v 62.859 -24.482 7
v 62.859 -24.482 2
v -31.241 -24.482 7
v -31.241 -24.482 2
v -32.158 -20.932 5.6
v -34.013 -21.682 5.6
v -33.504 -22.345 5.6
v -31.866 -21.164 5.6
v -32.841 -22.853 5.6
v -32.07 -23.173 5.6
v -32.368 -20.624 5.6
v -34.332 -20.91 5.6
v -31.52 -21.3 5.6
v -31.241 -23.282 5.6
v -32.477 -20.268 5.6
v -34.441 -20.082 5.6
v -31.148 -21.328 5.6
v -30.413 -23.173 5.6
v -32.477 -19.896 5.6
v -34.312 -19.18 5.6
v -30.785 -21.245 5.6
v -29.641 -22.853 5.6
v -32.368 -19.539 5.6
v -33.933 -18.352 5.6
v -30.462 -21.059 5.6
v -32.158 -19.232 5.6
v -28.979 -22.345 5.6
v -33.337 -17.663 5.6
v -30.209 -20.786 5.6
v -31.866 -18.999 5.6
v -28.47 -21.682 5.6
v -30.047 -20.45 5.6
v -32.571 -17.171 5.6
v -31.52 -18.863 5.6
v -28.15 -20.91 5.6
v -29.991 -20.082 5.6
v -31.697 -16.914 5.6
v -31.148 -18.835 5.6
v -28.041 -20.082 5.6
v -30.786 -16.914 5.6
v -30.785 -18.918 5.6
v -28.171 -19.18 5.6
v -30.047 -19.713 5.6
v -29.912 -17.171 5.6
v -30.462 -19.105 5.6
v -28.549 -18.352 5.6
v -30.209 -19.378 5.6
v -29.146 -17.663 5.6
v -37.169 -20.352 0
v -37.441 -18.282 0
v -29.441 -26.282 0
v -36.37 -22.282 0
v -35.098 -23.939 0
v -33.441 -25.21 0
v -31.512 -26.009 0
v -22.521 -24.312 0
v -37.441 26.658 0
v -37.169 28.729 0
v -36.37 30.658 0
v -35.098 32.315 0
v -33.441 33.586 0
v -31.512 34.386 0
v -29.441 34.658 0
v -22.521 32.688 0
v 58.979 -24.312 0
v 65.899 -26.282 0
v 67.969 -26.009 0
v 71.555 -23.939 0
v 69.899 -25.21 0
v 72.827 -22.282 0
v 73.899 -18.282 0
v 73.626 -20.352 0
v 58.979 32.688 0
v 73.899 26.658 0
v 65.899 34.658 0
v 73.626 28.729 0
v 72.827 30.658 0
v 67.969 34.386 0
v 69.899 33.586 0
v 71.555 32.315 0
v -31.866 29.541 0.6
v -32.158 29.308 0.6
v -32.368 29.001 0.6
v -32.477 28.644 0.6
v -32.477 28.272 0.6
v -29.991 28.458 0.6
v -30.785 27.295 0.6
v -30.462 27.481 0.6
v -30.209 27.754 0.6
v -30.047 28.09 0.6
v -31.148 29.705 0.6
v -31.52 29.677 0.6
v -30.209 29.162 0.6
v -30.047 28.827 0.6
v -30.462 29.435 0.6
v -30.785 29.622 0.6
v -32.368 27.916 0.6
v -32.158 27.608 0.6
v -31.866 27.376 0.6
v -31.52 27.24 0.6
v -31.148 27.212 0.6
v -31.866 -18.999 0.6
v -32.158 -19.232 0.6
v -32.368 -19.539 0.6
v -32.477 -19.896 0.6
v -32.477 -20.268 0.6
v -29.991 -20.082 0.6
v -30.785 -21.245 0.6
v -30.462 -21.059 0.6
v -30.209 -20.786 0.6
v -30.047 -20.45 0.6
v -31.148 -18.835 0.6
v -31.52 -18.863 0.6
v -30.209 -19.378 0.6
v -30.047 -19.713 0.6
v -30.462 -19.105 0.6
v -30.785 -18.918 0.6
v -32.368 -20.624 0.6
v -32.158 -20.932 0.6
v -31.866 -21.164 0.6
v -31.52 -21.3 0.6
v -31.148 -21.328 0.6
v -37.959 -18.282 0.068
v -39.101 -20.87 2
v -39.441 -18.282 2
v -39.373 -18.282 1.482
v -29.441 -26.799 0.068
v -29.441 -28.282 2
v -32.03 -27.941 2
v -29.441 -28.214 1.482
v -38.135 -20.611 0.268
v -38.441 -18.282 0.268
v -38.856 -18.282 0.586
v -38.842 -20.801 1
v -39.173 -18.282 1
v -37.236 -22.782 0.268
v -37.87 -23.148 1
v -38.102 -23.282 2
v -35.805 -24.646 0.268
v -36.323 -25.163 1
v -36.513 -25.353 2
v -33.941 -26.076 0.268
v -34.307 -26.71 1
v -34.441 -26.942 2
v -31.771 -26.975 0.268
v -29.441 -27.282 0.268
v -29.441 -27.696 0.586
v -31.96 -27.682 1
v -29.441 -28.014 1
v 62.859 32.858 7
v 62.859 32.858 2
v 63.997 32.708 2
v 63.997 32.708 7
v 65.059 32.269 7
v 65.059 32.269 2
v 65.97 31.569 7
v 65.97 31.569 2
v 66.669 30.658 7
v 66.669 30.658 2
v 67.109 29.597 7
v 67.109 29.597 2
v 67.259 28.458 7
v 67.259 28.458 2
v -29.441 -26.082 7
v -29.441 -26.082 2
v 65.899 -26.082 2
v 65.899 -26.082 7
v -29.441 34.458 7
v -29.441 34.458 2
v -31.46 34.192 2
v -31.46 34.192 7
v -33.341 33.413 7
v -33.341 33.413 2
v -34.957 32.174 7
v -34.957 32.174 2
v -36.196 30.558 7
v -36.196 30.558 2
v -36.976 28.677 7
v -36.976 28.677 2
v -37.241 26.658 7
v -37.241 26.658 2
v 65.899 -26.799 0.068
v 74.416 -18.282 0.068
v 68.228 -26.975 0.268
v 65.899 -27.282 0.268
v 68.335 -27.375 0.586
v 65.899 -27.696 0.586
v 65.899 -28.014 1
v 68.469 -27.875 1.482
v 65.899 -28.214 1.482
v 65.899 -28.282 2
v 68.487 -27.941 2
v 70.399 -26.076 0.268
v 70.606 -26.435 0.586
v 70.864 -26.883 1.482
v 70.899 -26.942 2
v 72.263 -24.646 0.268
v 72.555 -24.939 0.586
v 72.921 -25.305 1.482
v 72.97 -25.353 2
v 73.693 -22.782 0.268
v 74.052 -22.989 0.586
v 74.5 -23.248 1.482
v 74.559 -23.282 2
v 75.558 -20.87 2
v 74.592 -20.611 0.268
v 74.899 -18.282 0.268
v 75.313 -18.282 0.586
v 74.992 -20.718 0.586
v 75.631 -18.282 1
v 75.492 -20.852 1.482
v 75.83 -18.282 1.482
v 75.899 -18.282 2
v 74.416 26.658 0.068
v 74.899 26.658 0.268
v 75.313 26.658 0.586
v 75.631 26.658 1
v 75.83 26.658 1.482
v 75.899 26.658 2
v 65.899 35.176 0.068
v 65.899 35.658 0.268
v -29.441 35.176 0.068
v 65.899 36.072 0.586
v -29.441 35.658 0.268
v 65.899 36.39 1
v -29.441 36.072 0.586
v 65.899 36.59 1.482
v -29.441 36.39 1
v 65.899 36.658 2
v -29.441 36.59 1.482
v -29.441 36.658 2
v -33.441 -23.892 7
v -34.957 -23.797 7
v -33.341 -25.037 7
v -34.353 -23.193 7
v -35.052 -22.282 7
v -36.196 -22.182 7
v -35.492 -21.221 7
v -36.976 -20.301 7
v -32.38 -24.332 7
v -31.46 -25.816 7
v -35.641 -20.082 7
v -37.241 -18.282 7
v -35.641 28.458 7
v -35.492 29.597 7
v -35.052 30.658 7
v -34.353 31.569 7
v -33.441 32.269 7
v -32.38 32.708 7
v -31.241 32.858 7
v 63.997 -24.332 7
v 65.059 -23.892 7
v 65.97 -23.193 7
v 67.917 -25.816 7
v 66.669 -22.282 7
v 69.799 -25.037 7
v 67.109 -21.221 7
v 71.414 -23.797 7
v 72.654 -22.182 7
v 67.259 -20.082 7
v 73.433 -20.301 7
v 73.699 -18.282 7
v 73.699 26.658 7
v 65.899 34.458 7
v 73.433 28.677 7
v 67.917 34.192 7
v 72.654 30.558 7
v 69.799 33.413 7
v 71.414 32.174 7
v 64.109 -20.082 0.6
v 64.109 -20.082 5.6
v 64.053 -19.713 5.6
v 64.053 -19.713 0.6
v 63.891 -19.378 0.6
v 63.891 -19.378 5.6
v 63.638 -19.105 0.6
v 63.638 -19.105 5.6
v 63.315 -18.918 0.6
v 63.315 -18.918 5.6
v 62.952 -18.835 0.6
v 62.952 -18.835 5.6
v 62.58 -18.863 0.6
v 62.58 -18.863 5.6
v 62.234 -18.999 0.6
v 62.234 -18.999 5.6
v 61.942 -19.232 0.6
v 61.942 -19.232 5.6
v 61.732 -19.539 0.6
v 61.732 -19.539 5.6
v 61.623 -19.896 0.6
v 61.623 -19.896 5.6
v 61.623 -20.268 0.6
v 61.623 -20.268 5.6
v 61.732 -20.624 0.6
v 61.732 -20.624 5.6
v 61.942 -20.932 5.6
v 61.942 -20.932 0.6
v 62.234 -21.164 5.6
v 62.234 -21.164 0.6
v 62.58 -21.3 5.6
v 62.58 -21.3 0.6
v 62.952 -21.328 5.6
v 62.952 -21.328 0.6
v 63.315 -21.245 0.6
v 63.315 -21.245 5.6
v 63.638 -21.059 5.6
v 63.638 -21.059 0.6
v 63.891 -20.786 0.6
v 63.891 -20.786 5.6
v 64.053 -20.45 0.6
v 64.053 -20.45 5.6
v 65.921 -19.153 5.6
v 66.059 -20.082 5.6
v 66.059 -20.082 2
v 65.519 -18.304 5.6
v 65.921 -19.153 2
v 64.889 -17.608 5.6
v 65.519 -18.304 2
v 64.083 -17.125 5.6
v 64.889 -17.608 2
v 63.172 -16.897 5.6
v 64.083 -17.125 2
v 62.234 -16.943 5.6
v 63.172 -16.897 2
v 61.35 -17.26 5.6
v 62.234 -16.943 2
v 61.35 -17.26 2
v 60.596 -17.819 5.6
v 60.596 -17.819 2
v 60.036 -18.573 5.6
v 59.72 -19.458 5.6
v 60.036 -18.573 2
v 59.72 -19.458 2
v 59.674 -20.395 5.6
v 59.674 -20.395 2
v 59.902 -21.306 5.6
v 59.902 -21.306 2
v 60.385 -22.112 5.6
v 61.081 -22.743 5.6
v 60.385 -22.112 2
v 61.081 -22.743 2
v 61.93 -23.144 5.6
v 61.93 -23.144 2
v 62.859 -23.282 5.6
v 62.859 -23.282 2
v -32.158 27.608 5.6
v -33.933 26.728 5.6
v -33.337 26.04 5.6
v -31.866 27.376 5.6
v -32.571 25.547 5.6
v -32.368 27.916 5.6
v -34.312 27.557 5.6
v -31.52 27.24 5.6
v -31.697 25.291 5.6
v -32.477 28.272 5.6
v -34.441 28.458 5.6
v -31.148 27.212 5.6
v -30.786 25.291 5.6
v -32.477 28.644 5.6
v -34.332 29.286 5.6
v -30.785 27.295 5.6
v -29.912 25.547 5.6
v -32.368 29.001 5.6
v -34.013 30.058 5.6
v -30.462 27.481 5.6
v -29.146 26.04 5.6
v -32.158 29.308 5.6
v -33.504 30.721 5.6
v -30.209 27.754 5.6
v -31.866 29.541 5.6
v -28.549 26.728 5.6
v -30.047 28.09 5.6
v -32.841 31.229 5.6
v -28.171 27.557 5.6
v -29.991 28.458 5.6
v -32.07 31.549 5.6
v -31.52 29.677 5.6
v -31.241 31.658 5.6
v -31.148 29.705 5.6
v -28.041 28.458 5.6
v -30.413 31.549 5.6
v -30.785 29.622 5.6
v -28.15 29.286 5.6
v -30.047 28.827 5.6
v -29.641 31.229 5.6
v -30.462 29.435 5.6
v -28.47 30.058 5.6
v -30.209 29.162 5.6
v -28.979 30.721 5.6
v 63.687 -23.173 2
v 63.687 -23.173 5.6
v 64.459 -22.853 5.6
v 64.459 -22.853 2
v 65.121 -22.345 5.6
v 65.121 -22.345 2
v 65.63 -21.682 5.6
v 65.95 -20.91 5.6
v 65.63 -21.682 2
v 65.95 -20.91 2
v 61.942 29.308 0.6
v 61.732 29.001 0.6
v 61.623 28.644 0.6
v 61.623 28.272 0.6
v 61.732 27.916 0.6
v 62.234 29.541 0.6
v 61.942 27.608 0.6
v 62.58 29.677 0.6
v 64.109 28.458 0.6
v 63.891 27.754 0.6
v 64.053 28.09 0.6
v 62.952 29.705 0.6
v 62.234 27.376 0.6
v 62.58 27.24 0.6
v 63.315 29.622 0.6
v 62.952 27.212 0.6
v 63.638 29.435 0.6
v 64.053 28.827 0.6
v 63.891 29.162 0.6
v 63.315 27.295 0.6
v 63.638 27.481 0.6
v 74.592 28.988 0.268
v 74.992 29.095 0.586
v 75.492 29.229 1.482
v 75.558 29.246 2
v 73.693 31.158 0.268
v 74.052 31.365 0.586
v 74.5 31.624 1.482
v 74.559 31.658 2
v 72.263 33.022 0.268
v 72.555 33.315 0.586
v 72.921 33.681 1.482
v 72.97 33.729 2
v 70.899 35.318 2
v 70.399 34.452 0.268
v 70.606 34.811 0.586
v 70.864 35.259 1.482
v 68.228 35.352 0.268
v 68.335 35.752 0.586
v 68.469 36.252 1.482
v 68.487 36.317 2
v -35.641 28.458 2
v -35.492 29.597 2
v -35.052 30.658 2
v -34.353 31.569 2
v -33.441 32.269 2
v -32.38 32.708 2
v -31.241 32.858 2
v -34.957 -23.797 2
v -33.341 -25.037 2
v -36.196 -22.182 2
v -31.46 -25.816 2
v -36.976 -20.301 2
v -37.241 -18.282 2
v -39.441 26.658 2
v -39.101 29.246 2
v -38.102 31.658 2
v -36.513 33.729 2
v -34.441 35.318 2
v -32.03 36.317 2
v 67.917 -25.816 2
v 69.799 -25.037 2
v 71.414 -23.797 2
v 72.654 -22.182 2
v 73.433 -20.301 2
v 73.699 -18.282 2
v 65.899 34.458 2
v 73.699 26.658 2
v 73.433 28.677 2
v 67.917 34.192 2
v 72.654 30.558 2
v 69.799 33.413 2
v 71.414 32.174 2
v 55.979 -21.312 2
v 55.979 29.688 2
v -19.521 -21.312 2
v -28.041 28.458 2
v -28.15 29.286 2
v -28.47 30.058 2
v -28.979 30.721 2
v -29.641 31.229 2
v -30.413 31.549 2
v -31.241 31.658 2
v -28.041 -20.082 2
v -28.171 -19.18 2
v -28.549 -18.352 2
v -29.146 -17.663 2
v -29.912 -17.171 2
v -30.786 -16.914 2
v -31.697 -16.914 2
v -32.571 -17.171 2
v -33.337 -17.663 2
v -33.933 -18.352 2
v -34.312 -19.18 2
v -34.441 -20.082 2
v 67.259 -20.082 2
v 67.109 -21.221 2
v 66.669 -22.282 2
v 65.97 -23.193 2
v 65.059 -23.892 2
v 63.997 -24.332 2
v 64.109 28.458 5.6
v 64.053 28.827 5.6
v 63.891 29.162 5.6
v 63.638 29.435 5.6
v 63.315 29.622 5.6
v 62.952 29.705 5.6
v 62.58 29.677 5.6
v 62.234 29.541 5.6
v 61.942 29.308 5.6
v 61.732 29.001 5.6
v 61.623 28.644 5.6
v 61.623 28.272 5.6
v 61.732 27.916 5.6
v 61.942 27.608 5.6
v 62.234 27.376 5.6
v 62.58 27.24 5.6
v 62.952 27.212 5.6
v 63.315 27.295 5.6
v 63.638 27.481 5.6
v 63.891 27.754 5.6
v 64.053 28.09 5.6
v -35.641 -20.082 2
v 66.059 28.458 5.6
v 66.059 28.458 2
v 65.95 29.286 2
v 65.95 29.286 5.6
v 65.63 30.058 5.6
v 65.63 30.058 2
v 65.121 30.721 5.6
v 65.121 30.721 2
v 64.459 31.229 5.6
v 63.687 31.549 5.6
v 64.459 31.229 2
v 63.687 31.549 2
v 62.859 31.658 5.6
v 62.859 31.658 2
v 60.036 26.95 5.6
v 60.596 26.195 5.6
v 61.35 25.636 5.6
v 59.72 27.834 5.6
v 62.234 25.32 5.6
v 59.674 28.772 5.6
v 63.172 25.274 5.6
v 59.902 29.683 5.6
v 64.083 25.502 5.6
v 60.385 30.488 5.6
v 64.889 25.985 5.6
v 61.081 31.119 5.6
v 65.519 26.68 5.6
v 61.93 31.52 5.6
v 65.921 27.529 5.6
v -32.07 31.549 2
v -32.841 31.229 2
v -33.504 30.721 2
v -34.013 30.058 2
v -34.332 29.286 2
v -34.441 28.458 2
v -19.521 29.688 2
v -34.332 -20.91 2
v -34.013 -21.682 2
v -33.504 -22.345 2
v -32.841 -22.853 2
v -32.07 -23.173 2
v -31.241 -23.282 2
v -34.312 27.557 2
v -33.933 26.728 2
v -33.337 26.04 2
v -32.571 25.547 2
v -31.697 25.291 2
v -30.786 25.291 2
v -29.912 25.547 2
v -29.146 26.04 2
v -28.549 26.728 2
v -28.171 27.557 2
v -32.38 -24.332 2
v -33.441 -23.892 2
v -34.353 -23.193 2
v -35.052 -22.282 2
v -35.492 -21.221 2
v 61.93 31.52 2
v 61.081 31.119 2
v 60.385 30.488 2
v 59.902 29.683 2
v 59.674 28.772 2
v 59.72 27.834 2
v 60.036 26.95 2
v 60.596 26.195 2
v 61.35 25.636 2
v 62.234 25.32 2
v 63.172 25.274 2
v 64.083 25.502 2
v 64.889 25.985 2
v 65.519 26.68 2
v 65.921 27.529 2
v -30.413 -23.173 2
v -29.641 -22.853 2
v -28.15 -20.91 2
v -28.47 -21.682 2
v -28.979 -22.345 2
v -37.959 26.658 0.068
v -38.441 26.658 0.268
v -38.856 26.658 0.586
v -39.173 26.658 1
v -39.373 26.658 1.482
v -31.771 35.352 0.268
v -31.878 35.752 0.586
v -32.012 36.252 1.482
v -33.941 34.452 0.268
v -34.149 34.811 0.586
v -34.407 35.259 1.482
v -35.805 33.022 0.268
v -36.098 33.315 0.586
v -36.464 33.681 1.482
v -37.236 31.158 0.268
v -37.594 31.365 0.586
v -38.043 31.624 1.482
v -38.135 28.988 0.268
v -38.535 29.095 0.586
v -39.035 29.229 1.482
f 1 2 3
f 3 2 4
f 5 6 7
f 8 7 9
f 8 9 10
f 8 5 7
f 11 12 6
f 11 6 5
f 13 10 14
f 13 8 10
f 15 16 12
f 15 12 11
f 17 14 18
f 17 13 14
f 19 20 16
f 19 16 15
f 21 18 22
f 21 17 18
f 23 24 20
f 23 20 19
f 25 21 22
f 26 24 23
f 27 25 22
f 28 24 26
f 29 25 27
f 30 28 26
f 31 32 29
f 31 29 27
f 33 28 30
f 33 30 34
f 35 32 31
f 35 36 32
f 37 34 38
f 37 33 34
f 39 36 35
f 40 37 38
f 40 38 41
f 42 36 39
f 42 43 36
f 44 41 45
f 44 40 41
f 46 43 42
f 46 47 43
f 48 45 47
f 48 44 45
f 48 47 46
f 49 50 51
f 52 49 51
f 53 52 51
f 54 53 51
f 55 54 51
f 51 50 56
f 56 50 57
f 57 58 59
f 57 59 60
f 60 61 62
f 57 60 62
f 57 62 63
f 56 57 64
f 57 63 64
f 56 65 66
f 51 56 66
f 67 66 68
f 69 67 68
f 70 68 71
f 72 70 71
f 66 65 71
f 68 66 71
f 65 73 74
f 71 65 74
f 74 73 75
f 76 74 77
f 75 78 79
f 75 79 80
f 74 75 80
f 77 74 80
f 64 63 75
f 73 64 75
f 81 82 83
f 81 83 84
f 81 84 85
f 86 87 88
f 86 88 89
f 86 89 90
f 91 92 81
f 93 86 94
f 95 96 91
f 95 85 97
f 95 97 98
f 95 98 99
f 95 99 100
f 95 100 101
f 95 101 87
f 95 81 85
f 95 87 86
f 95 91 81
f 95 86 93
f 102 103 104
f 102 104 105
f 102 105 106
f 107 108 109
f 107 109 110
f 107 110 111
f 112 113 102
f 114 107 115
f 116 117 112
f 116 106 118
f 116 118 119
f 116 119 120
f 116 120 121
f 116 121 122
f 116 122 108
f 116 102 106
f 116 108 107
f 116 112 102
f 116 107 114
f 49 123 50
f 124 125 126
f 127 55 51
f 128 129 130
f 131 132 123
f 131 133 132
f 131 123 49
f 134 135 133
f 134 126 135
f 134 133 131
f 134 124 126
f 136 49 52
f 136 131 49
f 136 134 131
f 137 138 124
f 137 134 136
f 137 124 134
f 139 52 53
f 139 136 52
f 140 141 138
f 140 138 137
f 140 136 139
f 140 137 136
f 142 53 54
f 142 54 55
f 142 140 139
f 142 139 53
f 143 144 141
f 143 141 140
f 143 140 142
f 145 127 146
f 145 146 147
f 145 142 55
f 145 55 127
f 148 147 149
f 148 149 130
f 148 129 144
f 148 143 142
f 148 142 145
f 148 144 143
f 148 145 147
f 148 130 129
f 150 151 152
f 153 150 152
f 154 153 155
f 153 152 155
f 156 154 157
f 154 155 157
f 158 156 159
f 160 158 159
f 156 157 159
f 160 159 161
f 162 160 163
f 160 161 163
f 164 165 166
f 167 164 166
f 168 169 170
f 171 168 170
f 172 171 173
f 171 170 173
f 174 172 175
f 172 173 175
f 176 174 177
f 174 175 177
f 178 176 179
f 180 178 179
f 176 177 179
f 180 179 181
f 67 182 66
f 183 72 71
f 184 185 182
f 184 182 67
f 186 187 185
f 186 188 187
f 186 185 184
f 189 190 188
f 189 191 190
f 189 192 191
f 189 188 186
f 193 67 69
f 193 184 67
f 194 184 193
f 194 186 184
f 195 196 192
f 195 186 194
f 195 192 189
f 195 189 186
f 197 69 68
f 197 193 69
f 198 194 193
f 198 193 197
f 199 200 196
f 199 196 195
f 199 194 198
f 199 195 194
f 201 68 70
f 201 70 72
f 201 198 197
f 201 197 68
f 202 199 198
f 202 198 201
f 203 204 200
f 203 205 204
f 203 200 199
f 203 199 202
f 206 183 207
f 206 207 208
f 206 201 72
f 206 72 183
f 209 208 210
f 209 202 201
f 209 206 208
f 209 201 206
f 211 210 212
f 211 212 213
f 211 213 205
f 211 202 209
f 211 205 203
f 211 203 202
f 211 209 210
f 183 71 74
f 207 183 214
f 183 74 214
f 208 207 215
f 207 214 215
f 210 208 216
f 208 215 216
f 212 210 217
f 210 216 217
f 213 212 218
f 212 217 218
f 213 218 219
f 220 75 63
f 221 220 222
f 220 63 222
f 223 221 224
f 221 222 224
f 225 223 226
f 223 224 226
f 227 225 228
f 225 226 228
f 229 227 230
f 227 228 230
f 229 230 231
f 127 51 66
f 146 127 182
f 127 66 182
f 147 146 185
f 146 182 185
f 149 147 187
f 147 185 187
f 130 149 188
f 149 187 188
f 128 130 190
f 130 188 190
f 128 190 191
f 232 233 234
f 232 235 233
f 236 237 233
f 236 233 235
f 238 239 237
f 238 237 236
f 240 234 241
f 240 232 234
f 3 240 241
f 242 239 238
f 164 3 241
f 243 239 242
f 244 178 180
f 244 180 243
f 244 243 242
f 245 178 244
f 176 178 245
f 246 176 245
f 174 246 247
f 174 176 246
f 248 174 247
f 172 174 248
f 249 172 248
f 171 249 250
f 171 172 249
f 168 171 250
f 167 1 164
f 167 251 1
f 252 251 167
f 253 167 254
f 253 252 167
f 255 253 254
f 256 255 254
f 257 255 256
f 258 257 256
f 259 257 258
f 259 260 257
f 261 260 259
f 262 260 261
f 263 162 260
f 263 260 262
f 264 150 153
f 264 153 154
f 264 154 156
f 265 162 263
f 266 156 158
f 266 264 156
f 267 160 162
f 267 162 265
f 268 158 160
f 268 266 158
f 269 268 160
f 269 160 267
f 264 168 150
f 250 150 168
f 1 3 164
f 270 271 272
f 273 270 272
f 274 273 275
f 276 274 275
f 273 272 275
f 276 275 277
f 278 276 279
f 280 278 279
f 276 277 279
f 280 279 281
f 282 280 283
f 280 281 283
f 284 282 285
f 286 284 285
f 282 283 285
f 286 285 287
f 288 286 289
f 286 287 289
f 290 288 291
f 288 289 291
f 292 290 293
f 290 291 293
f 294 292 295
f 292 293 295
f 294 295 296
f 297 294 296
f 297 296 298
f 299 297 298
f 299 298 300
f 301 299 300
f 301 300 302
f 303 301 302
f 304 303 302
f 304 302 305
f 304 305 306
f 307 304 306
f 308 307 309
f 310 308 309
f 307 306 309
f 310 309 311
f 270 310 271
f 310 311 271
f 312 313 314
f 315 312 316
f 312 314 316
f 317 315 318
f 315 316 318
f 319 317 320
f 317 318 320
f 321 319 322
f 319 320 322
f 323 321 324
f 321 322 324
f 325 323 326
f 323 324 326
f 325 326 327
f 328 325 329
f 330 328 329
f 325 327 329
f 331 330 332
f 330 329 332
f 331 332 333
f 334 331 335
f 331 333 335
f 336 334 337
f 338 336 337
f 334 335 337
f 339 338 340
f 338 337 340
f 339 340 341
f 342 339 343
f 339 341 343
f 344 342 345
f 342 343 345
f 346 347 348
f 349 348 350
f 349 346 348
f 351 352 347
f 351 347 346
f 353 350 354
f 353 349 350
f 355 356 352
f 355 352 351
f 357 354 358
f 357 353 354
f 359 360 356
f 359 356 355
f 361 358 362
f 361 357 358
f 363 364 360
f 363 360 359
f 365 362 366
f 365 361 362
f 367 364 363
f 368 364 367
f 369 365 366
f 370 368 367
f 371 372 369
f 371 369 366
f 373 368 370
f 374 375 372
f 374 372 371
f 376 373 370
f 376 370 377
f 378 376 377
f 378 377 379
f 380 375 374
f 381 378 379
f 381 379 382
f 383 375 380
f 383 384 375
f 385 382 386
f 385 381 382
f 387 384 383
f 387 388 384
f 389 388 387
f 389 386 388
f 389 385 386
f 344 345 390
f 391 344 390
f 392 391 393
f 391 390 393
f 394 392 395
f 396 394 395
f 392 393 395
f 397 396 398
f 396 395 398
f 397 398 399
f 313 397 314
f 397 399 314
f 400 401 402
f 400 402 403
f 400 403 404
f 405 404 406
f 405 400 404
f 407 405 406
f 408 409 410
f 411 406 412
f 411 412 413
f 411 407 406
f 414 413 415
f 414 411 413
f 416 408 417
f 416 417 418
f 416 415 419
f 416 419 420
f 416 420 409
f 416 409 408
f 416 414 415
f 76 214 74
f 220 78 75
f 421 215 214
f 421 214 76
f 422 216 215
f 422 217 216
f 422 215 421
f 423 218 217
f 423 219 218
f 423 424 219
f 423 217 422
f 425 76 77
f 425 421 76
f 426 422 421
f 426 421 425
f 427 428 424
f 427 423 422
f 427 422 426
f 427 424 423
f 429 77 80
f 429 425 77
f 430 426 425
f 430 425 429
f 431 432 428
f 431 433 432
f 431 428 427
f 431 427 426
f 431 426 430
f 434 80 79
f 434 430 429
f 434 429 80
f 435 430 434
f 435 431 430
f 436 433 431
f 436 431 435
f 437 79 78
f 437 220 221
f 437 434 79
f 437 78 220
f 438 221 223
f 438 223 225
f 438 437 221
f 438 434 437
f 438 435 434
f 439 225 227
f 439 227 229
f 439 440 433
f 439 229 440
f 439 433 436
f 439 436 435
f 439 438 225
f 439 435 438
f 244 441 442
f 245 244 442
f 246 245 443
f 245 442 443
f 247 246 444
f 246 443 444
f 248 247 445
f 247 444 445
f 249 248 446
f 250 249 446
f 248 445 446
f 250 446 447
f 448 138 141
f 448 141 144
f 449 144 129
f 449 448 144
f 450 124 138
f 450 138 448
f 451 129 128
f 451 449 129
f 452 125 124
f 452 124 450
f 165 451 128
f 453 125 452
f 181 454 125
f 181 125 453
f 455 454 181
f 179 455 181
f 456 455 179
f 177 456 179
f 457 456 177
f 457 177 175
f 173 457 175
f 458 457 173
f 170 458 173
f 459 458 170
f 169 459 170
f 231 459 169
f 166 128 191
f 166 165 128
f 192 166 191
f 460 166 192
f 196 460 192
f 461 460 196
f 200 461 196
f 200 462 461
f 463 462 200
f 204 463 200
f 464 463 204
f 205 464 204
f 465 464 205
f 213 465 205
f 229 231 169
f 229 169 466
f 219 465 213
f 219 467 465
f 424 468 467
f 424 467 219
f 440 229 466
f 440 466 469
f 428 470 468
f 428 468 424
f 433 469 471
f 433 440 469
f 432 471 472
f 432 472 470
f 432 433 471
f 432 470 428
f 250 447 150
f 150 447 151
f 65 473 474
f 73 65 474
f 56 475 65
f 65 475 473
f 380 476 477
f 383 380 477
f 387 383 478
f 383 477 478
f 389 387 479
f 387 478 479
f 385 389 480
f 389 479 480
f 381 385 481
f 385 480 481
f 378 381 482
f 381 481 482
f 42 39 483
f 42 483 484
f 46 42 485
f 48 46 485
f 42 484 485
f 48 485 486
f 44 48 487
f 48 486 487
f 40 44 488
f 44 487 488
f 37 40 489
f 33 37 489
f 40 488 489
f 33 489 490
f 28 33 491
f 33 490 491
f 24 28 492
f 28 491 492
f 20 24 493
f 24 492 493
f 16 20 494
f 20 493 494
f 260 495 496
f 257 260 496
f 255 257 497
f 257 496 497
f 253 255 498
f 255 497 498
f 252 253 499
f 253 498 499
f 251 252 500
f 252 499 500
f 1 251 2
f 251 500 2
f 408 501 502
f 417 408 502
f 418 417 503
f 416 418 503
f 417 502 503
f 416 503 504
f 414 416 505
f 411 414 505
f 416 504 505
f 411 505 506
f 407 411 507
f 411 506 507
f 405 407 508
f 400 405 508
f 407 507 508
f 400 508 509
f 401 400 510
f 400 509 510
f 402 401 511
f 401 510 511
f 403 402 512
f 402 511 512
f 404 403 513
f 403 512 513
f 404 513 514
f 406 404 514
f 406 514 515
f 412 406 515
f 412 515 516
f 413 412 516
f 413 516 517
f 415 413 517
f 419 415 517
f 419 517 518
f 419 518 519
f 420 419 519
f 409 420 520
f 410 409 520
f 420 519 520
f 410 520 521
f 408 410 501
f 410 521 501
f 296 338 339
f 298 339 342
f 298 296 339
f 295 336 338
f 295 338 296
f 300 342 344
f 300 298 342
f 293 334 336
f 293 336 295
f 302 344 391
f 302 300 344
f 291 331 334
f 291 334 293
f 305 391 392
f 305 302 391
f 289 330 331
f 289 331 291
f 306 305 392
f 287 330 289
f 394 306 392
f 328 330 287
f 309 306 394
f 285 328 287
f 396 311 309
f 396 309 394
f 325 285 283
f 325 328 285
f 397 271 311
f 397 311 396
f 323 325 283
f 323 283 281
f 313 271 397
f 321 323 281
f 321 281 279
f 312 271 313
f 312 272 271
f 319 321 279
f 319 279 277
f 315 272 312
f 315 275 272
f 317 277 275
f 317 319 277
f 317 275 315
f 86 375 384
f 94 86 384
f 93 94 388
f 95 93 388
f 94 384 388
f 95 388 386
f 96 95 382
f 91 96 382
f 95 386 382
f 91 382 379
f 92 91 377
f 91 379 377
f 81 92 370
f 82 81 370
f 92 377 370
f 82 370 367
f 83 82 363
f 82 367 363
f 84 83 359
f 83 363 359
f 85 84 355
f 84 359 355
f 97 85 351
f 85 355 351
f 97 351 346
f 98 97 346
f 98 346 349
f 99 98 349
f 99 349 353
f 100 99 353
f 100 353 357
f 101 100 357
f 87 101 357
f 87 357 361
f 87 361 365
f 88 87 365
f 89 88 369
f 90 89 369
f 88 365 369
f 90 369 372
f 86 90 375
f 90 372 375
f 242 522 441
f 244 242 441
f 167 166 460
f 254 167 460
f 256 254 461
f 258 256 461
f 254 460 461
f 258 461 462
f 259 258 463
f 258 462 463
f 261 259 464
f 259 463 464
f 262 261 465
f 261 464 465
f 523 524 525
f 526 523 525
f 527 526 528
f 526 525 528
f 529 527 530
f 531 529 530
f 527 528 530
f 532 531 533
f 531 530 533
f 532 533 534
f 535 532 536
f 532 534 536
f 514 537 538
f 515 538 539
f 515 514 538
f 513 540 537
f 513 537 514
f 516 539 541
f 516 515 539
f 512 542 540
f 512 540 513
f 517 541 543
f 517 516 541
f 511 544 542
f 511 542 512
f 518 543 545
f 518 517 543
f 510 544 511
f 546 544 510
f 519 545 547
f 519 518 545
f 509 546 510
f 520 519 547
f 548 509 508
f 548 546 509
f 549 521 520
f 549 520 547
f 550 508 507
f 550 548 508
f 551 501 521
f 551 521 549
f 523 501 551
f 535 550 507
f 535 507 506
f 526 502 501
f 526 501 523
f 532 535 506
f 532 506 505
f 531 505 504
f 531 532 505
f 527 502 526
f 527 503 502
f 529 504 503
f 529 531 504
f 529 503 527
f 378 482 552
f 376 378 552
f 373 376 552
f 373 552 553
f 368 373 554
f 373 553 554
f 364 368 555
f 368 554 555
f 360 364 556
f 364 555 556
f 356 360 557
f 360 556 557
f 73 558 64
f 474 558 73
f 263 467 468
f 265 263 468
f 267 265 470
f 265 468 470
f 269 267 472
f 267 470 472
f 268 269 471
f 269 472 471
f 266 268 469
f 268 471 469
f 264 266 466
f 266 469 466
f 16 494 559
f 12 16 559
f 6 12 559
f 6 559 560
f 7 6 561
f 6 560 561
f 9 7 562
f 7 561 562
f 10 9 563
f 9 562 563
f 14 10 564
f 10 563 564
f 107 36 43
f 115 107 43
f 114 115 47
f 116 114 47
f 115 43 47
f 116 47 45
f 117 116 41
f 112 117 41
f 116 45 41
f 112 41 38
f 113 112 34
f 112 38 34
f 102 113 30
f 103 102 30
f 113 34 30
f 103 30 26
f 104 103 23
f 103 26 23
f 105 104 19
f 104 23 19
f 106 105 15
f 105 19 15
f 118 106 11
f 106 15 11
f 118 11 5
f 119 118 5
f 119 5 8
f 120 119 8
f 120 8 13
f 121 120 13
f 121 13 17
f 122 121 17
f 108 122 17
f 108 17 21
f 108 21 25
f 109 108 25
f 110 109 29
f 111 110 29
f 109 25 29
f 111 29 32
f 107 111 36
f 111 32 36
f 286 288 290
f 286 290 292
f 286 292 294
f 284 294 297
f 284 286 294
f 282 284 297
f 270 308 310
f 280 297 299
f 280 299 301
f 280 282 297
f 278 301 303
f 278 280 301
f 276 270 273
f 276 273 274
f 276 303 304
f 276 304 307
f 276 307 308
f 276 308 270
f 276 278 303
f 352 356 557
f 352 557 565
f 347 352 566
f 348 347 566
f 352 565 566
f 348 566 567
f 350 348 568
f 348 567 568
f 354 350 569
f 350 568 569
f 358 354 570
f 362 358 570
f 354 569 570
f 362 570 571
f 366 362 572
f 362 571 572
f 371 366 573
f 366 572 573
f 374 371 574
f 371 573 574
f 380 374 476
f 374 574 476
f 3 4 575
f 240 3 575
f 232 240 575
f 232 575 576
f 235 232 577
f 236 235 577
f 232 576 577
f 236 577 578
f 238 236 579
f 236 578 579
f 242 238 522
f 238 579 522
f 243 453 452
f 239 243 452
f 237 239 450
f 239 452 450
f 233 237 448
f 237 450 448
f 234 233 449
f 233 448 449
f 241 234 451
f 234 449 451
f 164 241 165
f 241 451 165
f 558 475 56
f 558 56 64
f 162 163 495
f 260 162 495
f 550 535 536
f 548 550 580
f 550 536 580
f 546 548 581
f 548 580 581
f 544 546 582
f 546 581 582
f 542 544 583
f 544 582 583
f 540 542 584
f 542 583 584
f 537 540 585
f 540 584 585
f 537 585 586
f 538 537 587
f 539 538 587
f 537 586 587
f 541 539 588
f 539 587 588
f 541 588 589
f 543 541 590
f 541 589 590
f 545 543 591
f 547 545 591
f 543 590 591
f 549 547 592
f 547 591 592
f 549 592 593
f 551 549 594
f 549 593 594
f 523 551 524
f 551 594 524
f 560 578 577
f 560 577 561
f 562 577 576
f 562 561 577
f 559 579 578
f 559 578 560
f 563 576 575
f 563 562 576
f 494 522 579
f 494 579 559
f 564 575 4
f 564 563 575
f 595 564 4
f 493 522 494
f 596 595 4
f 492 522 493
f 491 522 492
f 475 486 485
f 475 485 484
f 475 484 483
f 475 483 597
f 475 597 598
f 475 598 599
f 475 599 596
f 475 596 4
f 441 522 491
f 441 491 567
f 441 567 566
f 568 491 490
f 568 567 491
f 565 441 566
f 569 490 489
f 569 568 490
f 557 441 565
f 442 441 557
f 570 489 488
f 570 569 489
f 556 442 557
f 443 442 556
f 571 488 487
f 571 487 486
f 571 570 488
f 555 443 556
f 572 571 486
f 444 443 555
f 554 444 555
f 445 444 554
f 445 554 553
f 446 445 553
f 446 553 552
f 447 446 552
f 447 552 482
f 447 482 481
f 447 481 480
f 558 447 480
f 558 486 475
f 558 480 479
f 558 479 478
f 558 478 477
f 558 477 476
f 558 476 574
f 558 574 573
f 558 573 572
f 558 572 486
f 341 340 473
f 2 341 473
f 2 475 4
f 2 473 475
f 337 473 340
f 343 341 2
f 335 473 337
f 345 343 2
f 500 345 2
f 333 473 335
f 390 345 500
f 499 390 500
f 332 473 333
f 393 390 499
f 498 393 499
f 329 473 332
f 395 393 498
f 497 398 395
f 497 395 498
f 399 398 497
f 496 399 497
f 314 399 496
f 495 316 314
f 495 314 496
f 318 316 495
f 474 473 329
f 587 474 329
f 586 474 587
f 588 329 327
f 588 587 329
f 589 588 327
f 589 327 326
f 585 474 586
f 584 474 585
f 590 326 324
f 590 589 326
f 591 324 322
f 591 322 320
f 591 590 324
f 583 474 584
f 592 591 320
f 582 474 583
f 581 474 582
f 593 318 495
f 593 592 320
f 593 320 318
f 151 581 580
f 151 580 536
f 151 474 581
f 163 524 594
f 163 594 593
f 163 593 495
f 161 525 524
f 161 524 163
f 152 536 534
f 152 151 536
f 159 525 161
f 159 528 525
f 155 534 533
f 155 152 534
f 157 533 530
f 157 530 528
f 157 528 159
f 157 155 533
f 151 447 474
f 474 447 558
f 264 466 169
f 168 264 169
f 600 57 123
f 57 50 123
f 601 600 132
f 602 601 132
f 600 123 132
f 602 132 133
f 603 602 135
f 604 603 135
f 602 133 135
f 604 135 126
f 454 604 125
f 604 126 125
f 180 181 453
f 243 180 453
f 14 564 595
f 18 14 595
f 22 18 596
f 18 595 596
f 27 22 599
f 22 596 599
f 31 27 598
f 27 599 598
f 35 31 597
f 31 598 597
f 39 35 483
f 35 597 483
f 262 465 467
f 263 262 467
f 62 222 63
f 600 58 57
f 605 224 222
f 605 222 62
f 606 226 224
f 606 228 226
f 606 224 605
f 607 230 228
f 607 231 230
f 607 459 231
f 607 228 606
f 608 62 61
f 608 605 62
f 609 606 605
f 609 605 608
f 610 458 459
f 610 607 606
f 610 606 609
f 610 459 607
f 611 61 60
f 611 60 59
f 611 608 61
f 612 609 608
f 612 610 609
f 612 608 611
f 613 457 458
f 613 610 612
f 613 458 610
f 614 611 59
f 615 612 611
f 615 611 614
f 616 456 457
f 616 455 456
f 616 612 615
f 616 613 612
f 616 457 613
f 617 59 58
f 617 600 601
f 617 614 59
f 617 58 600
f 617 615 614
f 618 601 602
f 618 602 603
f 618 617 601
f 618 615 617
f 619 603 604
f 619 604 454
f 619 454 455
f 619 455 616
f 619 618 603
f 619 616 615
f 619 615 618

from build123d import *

# Parameters (mm, degrees)
F1_DEPTH = 5.6
F2_DEPTH = 7
F0_W     = 75.5
F0_H     = 51
F3_DEPTH = 2
F4_R     = 1.99999
F5_SIZE2 = 1.99999
F5_SIZE  = 2.99999
F6_R     = 1.25
F7_DEPTH = 5


# Not quite as in the source:
# - a fillet or chamfer is up to 0.001 mm smaller than in the source, because OpenCascade refuses the exact size


with BuildPart() as f1:
    # F0 (on Top) → F1 (new body)
    with BuildSketch(Plane.XY):
        with BuildLine():
            ThreePointArc((-34.4414402544, 28.4581715763), (-31.2414402544, 25.2581715763), (-28.0414402544, 28.4581715763))
            ThreePointArc((-28.0414402544, 28.4581715763), (-28.9786985547, 30.7209132761), (-31.2414402544, 31.6581715763))
            ThreePointArc((-31.2414402544, 31.6581715763), (-33.5041819542, 30.7209132761), (-34.4414402544, 28.4581715763))
        make_face()
    extrude(amount=F1_DEPTH)



with BuildPart() as f1b:
    # F0 (on Top) → F1, piece 2 (new body)
    with BuildSketch(Plane.XY):
        with BuildLine():
            ThreePointArc((-28.0414402544, -20.0818284237), (-31.2414402544, -16.8818284237), (-34.4414402544, -20.0818284237))
            ThreePointArc((-34.4414402544, -20.0818284237), (-33.5041819542, -22.3445701235), (-31.2414402544, -23.2818284237))
            ThreePointArc((-31.2414402544, -23.2818284237), (-28.9786985547, -22.3445701235), (-28.0414402544, -20.0818284237))
        make_face()
    extrude(amount=F1_DEPTH)


with BuildPart() as f1c:
    # F0 (on Top) → F1, piece 3 (new body)
    with BuildSketch(Plane.XY):
        with BuildLine():
            ThreePointArc((62.8585597456, -23.2818284237), (65.1213014453, -22.3445701235), (66.0585597456, -20.0818284237))
            ThreePointArc((66.0585597456, -20.0818284237), (60.5958180458, -17.8190867239), (62.8585597456, -23.2818284237))
        make_face()
    extrude(amount=F1_DEPTH)


with BuildPart() as f1d:
    # F0 (on Top) → F1, piece 4 (new body)
    with BuildSketch(Plane.XY):
        with BuildLine():
            ThreePointArc((66.0585597456, 28.4581715763), (65.1213014453, 30.7209132761), (62.8585597456, 31.6581715763))
            ThreePointArc((62.8585597456, 31.6581715763), (60.5958180458, 26.1954298765), (66.0585597456, 28.4581715763))
        make_face()
    extrude(amount=F1_DEPTH)


with BuildPart() as f2:
    # F0 (on Top) → F2 (new body)
    with BuildSketch(Plane.XY):
        with BuildLine():
            Line((65.8985597456, 34.4581715763), (-29.4414402544, 34.4581715763))
            ThreePointArc((-29.4414402544, 34.4581715763), (-34.9568731477, 32.1736044695), (-37.2414402544, 26.6581715763))
            Line((-37.2414402544, 26.6581715763), (-37.2414402544, -18.2818284237))
            ThreePointArc((-37.2414402544, -18.2818284237), (-34.9568731477, -23.797261317), (-29.4414402544, -26.0818284237))
            Line((-29.4414402544, -26.0818284237), (65.8985597456, -26.0818284237))
            ThreePointArc((65.8985597456, -26.0818284237), (71.4139926388, -23.797261317), (73.6985597456, -18.2818284237))
            Line((73.6985597456, -18.2818284237), (73.6985597456, 26.6581715763))
            ThreePointArc((73.6985597456, 26.6581715763), (71.4139926388, 32.1736044695), (65.8985597456, 34.4581715763))
        make_face()
        with BuildLine():
            ThreePointArc((62.8585597456, 32.8581709981), (65.9698291739, 31.5694410047), (67.2585591674, 28.4581715763))
            Line((67.2585591674, 28.4581715763), (67.2585591674, -20.0818284237))
            ThreePointArc((67.2585591674, -20.0818284237), (65.9698291739, -23.1930978521), (62.8585597456, -24.4818278456))
            Line((62.8585597456, -24.4818278456), (-31.2414402544, -24.4818278456))
            ThreePointArc((-31.2414402544, -24.4818278456), (-34.3527096828, -23.1930978521), (-35.6414396763, -20.0818284237))
            Line((-35.6414396763, -20.0818284237), (-35.6414396763, 28.4581715763))
            ThreePointArc((-35.6414396763, 28.4581715763), (-34.3527096828, 31.5694410047), (-31.2414402544, 32.8581709981))
            Line((-31.2414402544, 32.8581709981), (62.8585597456, 32.8581709981))
        make_face(mode=Mode.SUBTRACT)
    extrude(amount=F2_DEPTH)


with BuildPart() as f1_1:
    add(f1.part)

    add(f1b.part)  # F3 merges F1b

    add(f1c.part)  # F3 merges F1c

    add(f1d.part)  # F3 merges F1d

    add(f2.part)  # F3 merges F2
    # F0 (on Top) → F3 (join)
    with BuildSketch(Plane.XY):
        with BuildLine():
            Line((65.8985597456, 36.6581715763), (-29.4414402544, 36.6581715763))
            ThreePointArc((-29.4414402544, 36.6581715763), (-36.5125080663, 33.7292393881), (-39.4414402544, 26.6581715763))
            Line((-39.4414402544, 26.6581715763), (-39.4414402544, -18.2818284237))
            ThreePointArc((-39.4414402544, -18.2818284237), (-36.5125080663, -25.3528962356), (-29.4414402544, -28.2818284237))
            Line((-29.4414402544, -28.2818284237), (65.8985597456, -28.2818284237))
            ThreePointArc((65.8985597456, -28.2818284237), (72.9696275574, -25.3528962356), (75.8985597456, -18.2818284237))
            Line((75.8985597456, -18.2818284237), (75.8985597456, 26.6581715763))
            ThreePointArc((75.8985597456, 26.6581715763), (72.9696275574, 33.7292393881), (65.8985597456, 36.6581715763))
        make_face()
        with BuildLine():
            ThreePointArc((-37.2414402544, 26.6581715763), (-34.9568731477, 32.1736044695), (-29.4414402544, 34.4581715763))
            Line((-29.4414402544, 34.4581715763), (65.8985597456, 34.4581715763))
            ThreePointArc((65.8985597456, 34.4581715763), (71.4139926388, 32.1736044695), (73.6985597456, 26.6581715763))
            Line((73.6985597456, 26.6581715763), (73.6985597456, -18.2818284237))
            ThreePointArc((73.6985597456, -18.2818284237), (71.4139926388, -23.797261317), (65.8985597456, -26.0818284237))
            Line((65.8985597456, -26.0818284237), (-29.4414402544, -26.0818284237))
            ThreePointArc((-29.4414402544, -26.0818284237), (-34.9568731477, -23.797261317), (-37.2414402544, -18.2818284237))
            Line((-37.2414402544, -18.2818284237), (-37.2414402544, 26.6581715763))
        make_face(mode=Mode.SUBTRACT)
        with BuildLine():
            Line((67.2585591674, -20.0818284237), (67.2585591674, 28.4581715763))
            ThreePointArc((67.2585591674, 28.4581715763), (65.9698291739, 31.5694410047), (62.8585597456, 32.8581709981))
            Line((62.8585597456, 32.8581709981), (-31.2414402544, 32.8581709981))
            ThreePointArc((-31.2414402544, 32.8581709981), (-34.3527096828, 31.5694410047), (-35.6414396763, 28.4581715763))
            Line((-35.6414396763, 28.4581715763), (-35.6414396763, -20.0818284237))
            ThreePointArc((-35.6414396763, -20.0818284237), (-34.3527096828, -23.1930978521), (-31.2414402544, -24.4818278456))
            Line((-31.2414402544, -24.4818278456), (62.8585597456, -24.4818278456))
            ThreePointArc((62.8585597456, -24.4818278456), (65.9698291739, -23.1930978521), (67.2585591674, -20.0818284237))
        make_face()
        with BuildLine():
            ThreePointArc((-34.4414402544, 28.4581715763), (-33.5041819542, 30.7209132761), (-31.2414402544, 31.6581715763))
            Line((-31.2414402544, 31.6581715763), (62.8585597456, 31.6581715763))
            ThreePointArc((62.8585597456, 31.6581715763), (65.1213014453, 30.7209132761), (66.0585597456, 28.4581715763))
            Line((66.0585597456, 28.4581715763), (66.0585597456, -20.0818284237))
            ThreePointArc((66.0585597456, -20.0818284237), (65.1213014453, -22.3445701235), (62.8585597456, -23.2818284237))
            Line((62.8585597456, -23.2818284237), (-31.2414402544, -23.2818284237))
            ThreePointArc((-31.2414402544, -23.2818284237), (-33.5041819542, -22.3445701235), (-34.4414402544, -20.0818284237))
            Line((-34.4414402544, -20.0818284237), (-34.4414402544, 28.4581715763))
        make_face(mode=Mode.SUBTRACT)
        with BuildLine():
            ThreePointArc((-31.2414402544, 31.6581715763), (-28.9786985547, 30.7209132761), (-28.0414402544, 28.4581715763))
            ThreePointArc((-28.0414402544, 28.4581715763), (-31.2414402544, 25.2581715763), (-34.4414402544, 28.4581715763))
            Line((-34.4414402544, 28.4581715763), (-34.4414402544, -20.0818284237))
            ThreePointArc((-34.4414402544, -20.0818284237), (-31.2414402544, -16.8818284237), (-28.0414402544, -20.0818284237))
            ThreePointArc((-28.0414402544, -20.0818284237), (-28.9786985547, -22.3445701235), (-31.2414402544, -23.2818284237))
            Line((-31.2414402544, -23.2818284237), (62.8585597456, -23.2818284237))
            ThreePointArc((62.8585597456, -23.2818284237), (60.5958180458, -17.8190867239), (66.0585597456, -20.0818284237))
            Line((66.0585597456, -20.0818284237), (66.0585597456, 28.4581715763))
            ThreePointArc((66.0585597456, 28.4581715763), (60.5958180458, 26.1954298765), (62.8585597456, 31.6581715763))
            Line((62.8585597456, 31.6581715763), (-31.2414402544, 31.6581715763))
        make_face()
        with Locations((18.2285597456, 4.1881715763)):
            Rectangle(F0_W, F0_H, mode=Mode.SUBTRACT)
    extrude(amount=F3_DEPTH)

    # F4 (radius 2 in the source; OpenCascade refuses exactly that, so slightly less here)
    f4_edges = [f1_1.edges().sort_by_distance(p)[0] for p in [
        (-36.512508, -25.352896, 0),
    ]]
    fillet(f4_edges, radius=F4_R)

    # F5 (size 3 and 2 in the source; OpenCascade refuses exactly that, so slightly less here)
    f5_edges = [f1_1.edges().sort_by_distance(p)[0] for p in [
        (18.22856, 29.688172, 0),
        (-19.52144, 4.188172, 0),
        (18.22856, -21.311828, 0),
        (55.97856, 4.188172, 0),
    ]]
    f5_side = f1_1.faces().sort_by_distance((-34.200797, -23.041185, 0))[0]
    chamfer(f5_edges, length=F5_SIZE, length2=F5_SIZE2, reference=f5_side)

    # F6 (on face) → F7 (cut)
    with BuildSketch(Plane.XY.offset(5.6)):
        with Locations((-31.2414402544, 28.4581715763)):
            Circle(F6_R)
        with Locations((-31.2414402544, -20.0818284237)):
            Circle(F6_R)
        with Locations((62.8585597456, -20.0818284237)):
            Circle(F6_R)
        with Locations((62.8585597456, 28.4581715763)):
            Circle(F6_R)
    extrude(amount=-F7_DEPTH, mode=Mode.SUBTRACT)


solid = f1_1.part
